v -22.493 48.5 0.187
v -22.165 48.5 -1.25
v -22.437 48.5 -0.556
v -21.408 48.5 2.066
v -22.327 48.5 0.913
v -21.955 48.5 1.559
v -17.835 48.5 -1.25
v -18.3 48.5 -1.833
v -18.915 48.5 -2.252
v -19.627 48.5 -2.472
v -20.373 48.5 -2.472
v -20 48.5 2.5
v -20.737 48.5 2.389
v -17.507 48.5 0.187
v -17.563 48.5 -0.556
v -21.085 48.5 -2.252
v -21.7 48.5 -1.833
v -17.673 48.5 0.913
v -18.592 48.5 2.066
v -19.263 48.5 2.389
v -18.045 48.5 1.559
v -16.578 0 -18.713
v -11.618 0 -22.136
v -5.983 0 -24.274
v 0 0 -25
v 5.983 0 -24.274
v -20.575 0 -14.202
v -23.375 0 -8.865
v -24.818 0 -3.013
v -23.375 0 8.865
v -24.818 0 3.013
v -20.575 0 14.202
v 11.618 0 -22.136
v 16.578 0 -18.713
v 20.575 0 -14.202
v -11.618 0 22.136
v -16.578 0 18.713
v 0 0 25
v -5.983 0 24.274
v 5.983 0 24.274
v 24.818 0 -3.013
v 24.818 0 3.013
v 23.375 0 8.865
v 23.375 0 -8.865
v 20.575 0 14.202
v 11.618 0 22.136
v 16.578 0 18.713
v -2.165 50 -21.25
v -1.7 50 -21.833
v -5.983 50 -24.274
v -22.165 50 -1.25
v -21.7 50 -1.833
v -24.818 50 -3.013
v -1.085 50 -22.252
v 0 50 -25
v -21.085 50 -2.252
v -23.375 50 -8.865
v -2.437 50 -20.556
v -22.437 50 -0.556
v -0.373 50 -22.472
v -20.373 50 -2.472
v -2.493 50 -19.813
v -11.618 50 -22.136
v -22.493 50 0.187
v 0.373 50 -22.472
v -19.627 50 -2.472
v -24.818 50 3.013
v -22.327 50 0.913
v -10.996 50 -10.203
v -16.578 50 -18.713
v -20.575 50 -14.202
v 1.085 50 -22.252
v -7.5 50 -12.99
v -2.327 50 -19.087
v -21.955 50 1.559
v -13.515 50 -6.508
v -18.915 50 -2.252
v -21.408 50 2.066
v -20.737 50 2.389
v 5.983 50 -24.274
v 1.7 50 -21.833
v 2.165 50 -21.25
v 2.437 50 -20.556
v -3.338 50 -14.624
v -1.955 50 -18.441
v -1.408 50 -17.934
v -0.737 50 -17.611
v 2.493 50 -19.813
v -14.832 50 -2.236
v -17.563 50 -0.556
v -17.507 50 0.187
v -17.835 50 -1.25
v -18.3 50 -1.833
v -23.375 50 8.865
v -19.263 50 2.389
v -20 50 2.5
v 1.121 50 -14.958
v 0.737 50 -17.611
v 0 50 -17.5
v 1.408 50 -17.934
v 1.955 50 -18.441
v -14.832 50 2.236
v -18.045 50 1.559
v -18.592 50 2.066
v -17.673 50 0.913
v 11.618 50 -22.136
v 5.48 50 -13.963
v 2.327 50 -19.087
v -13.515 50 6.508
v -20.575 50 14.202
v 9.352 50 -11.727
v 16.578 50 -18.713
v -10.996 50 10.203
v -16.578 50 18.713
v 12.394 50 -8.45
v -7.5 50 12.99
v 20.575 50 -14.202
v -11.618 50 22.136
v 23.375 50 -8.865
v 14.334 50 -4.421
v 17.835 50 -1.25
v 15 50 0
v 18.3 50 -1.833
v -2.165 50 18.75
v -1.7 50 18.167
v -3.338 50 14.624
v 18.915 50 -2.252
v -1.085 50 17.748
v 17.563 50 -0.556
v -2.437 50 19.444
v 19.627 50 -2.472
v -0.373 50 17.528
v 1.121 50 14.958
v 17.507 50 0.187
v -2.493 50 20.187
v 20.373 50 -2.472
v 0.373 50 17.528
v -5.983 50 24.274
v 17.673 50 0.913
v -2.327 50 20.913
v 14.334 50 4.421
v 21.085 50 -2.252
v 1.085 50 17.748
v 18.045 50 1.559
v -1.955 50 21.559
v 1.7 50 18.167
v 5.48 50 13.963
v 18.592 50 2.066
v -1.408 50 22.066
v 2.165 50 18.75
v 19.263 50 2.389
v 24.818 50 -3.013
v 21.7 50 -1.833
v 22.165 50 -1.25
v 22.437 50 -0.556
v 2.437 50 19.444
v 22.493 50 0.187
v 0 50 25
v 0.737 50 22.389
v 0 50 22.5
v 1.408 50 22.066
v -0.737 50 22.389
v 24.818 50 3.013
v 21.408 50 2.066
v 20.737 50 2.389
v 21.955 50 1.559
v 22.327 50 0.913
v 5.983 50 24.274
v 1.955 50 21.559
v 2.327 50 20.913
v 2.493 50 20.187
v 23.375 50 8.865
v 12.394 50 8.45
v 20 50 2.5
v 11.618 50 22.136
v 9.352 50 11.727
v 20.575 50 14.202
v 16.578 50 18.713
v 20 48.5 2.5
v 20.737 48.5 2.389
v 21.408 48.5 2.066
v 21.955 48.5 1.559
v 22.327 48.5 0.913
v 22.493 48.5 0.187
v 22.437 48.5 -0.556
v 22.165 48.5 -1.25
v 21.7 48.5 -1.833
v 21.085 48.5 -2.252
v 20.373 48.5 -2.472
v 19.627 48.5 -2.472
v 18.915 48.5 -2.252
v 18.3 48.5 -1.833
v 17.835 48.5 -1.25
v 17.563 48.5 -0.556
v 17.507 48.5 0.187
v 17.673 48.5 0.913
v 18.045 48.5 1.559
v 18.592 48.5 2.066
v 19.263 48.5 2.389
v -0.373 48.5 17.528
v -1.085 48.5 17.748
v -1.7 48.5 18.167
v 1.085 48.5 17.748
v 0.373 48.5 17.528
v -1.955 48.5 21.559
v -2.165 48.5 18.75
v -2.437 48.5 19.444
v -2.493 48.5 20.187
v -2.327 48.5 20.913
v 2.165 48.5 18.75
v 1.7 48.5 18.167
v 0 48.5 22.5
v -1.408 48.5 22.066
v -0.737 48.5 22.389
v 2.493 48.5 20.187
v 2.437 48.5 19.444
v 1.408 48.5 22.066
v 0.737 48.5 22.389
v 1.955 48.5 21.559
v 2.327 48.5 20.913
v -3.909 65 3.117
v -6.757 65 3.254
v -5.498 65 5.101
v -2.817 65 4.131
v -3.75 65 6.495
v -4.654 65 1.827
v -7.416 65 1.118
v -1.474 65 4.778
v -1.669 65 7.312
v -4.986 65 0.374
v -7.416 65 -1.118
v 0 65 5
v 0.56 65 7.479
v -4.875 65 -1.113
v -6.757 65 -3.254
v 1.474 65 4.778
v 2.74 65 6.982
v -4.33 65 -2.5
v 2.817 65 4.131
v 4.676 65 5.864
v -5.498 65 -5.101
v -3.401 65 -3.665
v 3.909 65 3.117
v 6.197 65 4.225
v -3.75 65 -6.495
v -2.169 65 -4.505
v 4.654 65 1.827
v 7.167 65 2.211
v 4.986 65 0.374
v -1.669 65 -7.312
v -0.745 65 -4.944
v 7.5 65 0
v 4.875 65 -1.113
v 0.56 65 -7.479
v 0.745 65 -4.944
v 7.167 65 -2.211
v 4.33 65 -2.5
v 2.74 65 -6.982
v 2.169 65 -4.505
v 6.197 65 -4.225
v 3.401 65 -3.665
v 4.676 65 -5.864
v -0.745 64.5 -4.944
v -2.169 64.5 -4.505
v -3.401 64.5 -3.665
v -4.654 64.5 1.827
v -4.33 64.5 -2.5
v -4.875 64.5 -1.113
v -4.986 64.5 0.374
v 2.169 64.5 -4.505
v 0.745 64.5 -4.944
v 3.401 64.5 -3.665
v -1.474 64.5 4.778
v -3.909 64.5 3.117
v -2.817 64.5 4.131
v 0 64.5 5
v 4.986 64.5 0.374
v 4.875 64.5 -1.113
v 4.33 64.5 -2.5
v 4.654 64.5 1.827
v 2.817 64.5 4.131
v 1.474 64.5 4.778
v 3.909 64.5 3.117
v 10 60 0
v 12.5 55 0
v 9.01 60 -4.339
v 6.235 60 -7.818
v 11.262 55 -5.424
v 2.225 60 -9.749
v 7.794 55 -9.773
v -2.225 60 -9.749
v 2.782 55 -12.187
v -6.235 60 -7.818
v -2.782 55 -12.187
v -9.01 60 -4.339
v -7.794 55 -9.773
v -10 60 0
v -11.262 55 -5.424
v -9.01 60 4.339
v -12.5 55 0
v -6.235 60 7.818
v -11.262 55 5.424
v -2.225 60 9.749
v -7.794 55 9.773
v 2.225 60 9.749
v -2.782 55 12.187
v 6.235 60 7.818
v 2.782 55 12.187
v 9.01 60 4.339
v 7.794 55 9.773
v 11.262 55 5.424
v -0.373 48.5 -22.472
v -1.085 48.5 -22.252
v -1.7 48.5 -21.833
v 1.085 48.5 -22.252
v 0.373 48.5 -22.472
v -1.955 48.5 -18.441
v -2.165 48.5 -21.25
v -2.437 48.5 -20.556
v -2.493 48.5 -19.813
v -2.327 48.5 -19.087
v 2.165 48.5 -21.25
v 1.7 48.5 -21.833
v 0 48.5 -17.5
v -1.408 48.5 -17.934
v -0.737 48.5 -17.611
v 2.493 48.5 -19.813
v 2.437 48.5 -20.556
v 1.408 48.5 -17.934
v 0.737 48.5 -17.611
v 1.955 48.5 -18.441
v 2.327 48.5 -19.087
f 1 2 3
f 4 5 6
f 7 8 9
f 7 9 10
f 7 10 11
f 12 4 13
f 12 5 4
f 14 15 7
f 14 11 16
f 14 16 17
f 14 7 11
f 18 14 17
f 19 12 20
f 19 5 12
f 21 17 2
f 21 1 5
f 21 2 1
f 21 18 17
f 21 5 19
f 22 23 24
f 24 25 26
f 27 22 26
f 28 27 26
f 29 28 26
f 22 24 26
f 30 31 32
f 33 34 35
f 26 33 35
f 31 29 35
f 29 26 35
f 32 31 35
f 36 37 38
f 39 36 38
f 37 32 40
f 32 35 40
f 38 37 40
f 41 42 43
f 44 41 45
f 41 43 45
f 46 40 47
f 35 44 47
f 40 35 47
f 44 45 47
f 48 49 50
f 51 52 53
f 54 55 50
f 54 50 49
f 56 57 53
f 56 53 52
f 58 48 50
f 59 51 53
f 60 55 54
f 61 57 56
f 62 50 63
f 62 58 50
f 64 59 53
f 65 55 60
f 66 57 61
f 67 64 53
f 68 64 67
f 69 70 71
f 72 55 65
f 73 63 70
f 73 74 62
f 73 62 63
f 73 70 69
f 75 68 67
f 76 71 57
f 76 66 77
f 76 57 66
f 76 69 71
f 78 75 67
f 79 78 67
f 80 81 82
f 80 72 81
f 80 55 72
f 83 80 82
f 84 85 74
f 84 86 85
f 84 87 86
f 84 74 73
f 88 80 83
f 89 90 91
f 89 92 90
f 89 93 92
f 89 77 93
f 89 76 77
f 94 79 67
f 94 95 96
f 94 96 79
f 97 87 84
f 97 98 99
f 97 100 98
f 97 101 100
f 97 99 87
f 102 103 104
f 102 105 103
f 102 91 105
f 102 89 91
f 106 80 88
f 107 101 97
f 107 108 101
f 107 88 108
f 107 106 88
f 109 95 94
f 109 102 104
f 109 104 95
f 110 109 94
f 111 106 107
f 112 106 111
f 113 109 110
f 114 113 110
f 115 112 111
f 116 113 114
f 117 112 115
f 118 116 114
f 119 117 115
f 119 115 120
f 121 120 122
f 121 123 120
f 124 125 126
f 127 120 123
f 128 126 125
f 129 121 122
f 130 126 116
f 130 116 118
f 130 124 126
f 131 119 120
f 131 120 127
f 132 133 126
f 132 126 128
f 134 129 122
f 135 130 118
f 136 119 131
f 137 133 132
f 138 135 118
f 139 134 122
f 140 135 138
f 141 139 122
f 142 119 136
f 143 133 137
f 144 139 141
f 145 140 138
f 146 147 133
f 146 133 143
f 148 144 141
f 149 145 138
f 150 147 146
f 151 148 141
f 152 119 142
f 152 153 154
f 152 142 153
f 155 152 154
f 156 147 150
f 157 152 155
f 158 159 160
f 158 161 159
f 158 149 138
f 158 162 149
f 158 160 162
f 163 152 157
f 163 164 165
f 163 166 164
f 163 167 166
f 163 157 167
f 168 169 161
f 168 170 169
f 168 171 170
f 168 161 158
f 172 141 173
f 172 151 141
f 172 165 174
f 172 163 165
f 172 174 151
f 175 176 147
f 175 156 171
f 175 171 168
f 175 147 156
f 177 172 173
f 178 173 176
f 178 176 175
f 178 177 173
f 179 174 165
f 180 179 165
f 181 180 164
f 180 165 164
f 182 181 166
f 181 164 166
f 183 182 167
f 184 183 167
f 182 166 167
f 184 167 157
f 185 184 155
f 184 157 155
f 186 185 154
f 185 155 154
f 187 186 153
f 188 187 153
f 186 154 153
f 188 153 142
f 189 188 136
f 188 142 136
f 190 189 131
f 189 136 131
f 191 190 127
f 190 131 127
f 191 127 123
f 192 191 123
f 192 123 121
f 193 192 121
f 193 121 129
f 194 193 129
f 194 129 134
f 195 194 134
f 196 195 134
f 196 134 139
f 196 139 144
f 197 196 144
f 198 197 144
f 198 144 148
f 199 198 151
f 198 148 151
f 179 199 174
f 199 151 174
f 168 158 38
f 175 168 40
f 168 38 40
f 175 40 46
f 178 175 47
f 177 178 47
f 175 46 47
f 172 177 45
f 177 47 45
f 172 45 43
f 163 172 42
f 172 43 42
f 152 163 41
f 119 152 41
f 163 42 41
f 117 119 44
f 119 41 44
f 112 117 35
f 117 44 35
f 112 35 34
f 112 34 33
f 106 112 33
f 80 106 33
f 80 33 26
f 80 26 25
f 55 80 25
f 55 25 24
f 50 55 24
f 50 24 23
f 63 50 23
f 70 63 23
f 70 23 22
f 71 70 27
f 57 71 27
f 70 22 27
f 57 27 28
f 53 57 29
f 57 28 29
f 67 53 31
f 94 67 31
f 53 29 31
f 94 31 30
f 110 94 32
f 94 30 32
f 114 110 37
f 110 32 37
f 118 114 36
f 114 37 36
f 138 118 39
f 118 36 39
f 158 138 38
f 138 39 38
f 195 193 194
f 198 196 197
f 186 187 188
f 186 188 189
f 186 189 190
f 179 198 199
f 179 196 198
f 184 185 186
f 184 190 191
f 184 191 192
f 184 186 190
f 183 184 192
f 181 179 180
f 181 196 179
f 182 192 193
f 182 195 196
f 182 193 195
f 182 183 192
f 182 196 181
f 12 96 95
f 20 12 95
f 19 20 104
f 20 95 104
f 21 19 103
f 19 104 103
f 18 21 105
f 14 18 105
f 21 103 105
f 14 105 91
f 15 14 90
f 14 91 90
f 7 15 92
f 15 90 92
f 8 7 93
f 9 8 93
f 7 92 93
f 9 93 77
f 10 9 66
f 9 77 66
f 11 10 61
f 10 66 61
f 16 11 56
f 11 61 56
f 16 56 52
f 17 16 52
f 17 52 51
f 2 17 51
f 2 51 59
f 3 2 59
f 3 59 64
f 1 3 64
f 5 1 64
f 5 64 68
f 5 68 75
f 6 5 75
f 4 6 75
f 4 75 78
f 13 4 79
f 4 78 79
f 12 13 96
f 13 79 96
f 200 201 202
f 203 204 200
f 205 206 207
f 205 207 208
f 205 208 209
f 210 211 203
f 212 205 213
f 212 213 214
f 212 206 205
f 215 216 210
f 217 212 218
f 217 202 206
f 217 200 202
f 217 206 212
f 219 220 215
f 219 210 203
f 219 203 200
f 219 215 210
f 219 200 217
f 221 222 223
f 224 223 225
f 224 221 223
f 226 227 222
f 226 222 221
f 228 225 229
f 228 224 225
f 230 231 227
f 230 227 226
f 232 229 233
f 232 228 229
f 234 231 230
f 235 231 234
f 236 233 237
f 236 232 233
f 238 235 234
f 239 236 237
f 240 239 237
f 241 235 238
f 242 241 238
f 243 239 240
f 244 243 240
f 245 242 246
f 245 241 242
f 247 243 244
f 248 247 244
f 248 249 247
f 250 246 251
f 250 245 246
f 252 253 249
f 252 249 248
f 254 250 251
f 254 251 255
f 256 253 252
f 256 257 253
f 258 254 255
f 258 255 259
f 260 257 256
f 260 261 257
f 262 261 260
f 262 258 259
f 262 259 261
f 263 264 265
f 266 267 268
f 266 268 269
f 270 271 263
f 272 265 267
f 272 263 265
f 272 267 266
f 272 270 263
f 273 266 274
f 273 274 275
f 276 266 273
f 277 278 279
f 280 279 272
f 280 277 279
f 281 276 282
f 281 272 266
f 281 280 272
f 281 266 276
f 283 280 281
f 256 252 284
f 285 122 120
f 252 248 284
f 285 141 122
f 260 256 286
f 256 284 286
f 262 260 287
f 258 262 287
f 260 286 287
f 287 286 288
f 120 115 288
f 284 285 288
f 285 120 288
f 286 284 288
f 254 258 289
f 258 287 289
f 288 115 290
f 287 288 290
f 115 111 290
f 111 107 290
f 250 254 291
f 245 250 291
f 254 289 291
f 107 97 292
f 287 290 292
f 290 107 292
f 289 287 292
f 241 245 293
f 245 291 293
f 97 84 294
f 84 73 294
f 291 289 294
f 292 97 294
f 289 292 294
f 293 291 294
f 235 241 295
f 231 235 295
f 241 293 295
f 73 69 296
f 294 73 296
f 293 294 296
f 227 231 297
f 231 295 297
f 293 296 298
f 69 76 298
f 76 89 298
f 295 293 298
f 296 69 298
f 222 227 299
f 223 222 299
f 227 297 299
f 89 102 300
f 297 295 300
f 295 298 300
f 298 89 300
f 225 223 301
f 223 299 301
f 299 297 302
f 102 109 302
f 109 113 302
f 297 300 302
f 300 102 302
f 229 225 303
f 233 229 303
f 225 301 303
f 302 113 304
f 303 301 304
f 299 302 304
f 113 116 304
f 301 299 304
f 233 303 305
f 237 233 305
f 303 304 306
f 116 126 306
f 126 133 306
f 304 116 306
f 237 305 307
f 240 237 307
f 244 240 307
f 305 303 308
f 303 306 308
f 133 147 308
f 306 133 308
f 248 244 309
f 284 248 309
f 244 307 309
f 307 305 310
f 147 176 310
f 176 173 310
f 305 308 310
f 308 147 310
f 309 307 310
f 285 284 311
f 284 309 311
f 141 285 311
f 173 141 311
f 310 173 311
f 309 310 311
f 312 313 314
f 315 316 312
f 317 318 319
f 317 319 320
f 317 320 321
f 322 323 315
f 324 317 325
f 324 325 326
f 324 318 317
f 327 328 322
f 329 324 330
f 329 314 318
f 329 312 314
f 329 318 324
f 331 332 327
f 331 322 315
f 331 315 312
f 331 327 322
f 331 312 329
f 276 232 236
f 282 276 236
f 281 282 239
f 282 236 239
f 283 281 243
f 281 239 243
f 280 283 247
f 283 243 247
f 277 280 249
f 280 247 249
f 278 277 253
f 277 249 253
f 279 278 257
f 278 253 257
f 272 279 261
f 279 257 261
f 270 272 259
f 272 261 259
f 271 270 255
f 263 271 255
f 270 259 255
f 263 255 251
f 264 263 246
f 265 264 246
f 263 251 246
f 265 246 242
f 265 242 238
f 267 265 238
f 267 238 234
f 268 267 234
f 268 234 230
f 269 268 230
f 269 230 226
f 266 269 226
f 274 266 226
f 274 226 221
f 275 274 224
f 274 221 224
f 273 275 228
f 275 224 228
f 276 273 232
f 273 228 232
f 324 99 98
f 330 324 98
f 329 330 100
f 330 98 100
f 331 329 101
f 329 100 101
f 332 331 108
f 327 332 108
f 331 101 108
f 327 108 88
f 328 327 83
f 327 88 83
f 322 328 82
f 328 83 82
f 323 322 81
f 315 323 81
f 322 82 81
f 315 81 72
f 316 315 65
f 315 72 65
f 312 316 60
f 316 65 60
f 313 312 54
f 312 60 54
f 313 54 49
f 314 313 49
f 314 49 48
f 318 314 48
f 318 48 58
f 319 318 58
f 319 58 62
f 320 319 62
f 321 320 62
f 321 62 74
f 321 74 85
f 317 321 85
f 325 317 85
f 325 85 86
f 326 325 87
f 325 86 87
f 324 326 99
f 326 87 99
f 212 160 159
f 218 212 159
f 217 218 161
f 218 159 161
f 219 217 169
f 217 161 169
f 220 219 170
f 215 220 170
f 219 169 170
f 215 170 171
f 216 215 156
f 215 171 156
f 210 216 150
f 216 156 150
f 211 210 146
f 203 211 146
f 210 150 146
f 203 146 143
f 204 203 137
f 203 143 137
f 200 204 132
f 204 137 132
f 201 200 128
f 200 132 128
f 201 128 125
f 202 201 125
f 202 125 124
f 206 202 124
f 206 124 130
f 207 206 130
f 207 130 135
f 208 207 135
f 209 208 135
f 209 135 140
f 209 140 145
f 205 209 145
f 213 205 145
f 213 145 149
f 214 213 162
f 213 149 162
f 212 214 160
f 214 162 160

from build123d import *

# Parameters (mm, degrees)
SKETCH1_R           = 25
BOSS_EXTRUDE1_DEPTH = 50
SKETCH3_R           = 7.5
SKETCH4_R           = 15
SKETCH5_R           = 5
CUT_EXTRUDE1_DEPTH  = 0.5
CUT_EXTRUDE2_START  = -15
SKETCH5_4_R         = 2.5
CUT_EXTRUDE2_DEPTH  = 1.5


with BuildPart() as part:
    # Sketch1 → Boss-Extrude1 (new body)
    with BuildSketch(Plane(origin=(0, 0, 0), x_dir=(1, 0, 0), z_dir=(0, 1, 0))):
        with Locations(Location((0, 0, 0), (0, 0, 270))):
            Circle(SKETCH1_R)
    extrude(amount=BOSS_EXTRUDE1_DEPTH)

    # Sketch3 → Loft1 section 0
    with BuildSketch(Plane(origin=(0, 65, 0), x_dir=(1, 0, 0), z_dir=(0, 1, 0))):
        Circle(SKETCH3_R)
    # Sketch4 → Loft1 section 1
    with BuildSketch(Plane(origin=(0, 50, 0), x_dir=(1, 0, 0), z_dir=(0, 1, 0))):
        Circle(SKETCH4_R)
    loft()

    # Sketch5 → Cut-Extrude1 (cut)
    with BuildSketch(Plane(origin=(0, 65, 0), x_dir=(1, 0, 0), z_dir=(0, 1, 0))):
        with Locations(Location((0, 0, 0), (0, 0, 270))):
            Circle(SKETCH5_R)
    extrude(amount=-CUT_EXTRUDE1_DEPTH, mode=Mode.SUBTRACT)

    # Sketch5<4> → Cut-Extrude2 (cut)
    with BuildSketch(Plane(origin=(0, 65, 0), x_dir=(1, 0, 0), z_dir=(0, 1, 0)).offset(CUT_EXTRUDE2_START)):
        with Locations(Location((-20, 0, 0), (0, 0, 270))):
            Circle(SKETCH5_4_R)
        with Locations(Location((0, 20, 0), (0, 0, 270))):
            Circle(SKETCH5_4_R)
        with Locations(Location((20, 0, 0), (0, 0, 270))):
            Circle(SKETCH5_4_R)
        with Locations(Location((0, -20, 0), (0, 0, 270))):
            Circle(SKETCH5_4_R)
    extrude(amount=-CUT_EXTRUDE2_DEPTH, mode=Mode.SUBTRACT)


solid = part.part
